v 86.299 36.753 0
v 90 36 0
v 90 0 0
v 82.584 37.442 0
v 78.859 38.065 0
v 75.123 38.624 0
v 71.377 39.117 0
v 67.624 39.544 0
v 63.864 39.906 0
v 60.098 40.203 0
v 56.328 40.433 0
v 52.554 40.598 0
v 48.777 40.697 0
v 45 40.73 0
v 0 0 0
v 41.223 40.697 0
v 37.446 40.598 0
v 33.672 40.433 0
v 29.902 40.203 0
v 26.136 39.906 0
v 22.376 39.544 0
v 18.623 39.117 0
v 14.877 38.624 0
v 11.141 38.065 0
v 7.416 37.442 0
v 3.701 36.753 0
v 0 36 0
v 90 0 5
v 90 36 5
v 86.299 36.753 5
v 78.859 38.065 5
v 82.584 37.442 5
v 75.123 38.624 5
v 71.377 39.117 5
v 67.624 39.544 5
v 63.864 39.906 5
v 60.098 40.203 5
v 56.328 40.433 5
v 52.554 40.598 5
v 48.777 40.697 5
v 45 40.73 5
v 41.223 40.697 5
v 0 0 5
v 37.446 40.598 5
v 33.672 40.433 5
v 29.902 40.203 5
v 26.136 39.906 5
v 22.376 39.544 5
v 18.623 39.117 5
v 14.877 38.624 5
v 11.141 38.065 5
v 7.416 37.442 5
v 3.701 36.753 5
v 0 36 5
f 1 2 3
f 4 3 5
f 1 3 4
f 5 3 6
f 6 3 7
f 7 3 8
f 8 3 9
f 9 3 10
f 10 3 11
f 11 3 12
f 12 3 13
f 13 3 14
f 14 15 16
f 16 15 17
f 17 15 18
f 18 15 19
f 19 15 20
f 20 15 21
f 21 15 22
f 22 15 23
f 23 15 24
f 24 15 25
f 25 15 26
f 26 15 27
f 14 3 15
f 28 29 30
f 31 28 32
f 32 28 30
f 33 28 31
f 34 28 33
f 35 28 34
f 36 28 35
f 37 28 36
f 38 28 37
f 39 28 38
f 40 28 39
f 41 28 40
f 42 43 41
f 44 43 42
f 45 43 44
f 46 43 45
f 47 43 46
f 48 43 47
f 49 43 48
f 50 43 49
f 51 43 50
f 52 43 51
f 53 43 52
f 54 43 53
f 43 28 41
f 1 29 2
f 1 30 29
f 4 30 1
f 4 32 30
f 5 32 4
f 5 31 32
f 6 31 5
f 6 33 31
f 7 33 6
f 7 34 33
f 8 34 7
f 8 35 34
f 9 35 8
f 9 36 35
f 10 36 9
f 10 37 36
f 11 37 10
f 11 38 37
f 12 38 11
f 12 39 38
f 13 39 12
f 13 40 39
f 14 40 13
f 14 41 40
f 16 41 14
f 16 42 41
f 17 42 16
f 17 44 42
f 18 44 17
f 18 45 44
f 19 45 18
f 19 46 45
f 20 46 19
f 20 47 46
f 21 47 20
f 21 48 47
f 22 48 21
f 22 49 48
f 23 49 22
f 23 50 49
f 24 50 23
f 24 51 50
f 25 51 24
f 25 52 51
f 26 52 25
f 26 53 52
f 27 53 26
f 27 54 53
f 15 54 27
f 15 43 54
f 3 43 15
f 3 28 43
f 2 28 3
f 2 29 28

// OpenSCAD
$fn = 32;

// ----------------------------------------------------------------------
// Arc profile plate: crown, 27 points
// ----------------------------------------------------------------------

// --- parameters (mm) ---
bar_l = 90;               // bar length, X
bar_w = 36;               // bar height at the ends, Y
arc_r = 216.44;           // radius of the crown arc
arc_angle = 24;           // crown arc angle, degrees
crown_rise = 4.73;        // rise of the crown over the ends
arc_step = 1;             // sampling step of the crown arc, degrees
plate_t = 5;              // plate thickness, Z

bbox_y = bar_w + crown_rise;  // full height with the crown

profile = [[90, 36], [86.299, 36.753], [82.584, 37.442], [78.859, 38.065], [75.123, 38.624], [71.377, 39.117], [67.624, 39.544], [63.864, 39.906], [60.098, 40.203], [56.328, 40.433], [52.554, 40.598], [48.777, 40.697], [45, 40.73], [41.223, 40.697], [37.446, 40.598], [33.672, 40.433], [29.902, 40.203], [26.136, 39.906], [22.376, 39.544], [18.623, 39.117], [14.877, 38.624], [11.141, 38.065], [7.416, 37.442], [3.701, 36.753], [0, 36], [0, 0], [90, 0]];  // primary outline, 27 points, counter clockwise

// --- the one profile operation ---
linear_extrude(height = plate_t) polygon(points = profile);
